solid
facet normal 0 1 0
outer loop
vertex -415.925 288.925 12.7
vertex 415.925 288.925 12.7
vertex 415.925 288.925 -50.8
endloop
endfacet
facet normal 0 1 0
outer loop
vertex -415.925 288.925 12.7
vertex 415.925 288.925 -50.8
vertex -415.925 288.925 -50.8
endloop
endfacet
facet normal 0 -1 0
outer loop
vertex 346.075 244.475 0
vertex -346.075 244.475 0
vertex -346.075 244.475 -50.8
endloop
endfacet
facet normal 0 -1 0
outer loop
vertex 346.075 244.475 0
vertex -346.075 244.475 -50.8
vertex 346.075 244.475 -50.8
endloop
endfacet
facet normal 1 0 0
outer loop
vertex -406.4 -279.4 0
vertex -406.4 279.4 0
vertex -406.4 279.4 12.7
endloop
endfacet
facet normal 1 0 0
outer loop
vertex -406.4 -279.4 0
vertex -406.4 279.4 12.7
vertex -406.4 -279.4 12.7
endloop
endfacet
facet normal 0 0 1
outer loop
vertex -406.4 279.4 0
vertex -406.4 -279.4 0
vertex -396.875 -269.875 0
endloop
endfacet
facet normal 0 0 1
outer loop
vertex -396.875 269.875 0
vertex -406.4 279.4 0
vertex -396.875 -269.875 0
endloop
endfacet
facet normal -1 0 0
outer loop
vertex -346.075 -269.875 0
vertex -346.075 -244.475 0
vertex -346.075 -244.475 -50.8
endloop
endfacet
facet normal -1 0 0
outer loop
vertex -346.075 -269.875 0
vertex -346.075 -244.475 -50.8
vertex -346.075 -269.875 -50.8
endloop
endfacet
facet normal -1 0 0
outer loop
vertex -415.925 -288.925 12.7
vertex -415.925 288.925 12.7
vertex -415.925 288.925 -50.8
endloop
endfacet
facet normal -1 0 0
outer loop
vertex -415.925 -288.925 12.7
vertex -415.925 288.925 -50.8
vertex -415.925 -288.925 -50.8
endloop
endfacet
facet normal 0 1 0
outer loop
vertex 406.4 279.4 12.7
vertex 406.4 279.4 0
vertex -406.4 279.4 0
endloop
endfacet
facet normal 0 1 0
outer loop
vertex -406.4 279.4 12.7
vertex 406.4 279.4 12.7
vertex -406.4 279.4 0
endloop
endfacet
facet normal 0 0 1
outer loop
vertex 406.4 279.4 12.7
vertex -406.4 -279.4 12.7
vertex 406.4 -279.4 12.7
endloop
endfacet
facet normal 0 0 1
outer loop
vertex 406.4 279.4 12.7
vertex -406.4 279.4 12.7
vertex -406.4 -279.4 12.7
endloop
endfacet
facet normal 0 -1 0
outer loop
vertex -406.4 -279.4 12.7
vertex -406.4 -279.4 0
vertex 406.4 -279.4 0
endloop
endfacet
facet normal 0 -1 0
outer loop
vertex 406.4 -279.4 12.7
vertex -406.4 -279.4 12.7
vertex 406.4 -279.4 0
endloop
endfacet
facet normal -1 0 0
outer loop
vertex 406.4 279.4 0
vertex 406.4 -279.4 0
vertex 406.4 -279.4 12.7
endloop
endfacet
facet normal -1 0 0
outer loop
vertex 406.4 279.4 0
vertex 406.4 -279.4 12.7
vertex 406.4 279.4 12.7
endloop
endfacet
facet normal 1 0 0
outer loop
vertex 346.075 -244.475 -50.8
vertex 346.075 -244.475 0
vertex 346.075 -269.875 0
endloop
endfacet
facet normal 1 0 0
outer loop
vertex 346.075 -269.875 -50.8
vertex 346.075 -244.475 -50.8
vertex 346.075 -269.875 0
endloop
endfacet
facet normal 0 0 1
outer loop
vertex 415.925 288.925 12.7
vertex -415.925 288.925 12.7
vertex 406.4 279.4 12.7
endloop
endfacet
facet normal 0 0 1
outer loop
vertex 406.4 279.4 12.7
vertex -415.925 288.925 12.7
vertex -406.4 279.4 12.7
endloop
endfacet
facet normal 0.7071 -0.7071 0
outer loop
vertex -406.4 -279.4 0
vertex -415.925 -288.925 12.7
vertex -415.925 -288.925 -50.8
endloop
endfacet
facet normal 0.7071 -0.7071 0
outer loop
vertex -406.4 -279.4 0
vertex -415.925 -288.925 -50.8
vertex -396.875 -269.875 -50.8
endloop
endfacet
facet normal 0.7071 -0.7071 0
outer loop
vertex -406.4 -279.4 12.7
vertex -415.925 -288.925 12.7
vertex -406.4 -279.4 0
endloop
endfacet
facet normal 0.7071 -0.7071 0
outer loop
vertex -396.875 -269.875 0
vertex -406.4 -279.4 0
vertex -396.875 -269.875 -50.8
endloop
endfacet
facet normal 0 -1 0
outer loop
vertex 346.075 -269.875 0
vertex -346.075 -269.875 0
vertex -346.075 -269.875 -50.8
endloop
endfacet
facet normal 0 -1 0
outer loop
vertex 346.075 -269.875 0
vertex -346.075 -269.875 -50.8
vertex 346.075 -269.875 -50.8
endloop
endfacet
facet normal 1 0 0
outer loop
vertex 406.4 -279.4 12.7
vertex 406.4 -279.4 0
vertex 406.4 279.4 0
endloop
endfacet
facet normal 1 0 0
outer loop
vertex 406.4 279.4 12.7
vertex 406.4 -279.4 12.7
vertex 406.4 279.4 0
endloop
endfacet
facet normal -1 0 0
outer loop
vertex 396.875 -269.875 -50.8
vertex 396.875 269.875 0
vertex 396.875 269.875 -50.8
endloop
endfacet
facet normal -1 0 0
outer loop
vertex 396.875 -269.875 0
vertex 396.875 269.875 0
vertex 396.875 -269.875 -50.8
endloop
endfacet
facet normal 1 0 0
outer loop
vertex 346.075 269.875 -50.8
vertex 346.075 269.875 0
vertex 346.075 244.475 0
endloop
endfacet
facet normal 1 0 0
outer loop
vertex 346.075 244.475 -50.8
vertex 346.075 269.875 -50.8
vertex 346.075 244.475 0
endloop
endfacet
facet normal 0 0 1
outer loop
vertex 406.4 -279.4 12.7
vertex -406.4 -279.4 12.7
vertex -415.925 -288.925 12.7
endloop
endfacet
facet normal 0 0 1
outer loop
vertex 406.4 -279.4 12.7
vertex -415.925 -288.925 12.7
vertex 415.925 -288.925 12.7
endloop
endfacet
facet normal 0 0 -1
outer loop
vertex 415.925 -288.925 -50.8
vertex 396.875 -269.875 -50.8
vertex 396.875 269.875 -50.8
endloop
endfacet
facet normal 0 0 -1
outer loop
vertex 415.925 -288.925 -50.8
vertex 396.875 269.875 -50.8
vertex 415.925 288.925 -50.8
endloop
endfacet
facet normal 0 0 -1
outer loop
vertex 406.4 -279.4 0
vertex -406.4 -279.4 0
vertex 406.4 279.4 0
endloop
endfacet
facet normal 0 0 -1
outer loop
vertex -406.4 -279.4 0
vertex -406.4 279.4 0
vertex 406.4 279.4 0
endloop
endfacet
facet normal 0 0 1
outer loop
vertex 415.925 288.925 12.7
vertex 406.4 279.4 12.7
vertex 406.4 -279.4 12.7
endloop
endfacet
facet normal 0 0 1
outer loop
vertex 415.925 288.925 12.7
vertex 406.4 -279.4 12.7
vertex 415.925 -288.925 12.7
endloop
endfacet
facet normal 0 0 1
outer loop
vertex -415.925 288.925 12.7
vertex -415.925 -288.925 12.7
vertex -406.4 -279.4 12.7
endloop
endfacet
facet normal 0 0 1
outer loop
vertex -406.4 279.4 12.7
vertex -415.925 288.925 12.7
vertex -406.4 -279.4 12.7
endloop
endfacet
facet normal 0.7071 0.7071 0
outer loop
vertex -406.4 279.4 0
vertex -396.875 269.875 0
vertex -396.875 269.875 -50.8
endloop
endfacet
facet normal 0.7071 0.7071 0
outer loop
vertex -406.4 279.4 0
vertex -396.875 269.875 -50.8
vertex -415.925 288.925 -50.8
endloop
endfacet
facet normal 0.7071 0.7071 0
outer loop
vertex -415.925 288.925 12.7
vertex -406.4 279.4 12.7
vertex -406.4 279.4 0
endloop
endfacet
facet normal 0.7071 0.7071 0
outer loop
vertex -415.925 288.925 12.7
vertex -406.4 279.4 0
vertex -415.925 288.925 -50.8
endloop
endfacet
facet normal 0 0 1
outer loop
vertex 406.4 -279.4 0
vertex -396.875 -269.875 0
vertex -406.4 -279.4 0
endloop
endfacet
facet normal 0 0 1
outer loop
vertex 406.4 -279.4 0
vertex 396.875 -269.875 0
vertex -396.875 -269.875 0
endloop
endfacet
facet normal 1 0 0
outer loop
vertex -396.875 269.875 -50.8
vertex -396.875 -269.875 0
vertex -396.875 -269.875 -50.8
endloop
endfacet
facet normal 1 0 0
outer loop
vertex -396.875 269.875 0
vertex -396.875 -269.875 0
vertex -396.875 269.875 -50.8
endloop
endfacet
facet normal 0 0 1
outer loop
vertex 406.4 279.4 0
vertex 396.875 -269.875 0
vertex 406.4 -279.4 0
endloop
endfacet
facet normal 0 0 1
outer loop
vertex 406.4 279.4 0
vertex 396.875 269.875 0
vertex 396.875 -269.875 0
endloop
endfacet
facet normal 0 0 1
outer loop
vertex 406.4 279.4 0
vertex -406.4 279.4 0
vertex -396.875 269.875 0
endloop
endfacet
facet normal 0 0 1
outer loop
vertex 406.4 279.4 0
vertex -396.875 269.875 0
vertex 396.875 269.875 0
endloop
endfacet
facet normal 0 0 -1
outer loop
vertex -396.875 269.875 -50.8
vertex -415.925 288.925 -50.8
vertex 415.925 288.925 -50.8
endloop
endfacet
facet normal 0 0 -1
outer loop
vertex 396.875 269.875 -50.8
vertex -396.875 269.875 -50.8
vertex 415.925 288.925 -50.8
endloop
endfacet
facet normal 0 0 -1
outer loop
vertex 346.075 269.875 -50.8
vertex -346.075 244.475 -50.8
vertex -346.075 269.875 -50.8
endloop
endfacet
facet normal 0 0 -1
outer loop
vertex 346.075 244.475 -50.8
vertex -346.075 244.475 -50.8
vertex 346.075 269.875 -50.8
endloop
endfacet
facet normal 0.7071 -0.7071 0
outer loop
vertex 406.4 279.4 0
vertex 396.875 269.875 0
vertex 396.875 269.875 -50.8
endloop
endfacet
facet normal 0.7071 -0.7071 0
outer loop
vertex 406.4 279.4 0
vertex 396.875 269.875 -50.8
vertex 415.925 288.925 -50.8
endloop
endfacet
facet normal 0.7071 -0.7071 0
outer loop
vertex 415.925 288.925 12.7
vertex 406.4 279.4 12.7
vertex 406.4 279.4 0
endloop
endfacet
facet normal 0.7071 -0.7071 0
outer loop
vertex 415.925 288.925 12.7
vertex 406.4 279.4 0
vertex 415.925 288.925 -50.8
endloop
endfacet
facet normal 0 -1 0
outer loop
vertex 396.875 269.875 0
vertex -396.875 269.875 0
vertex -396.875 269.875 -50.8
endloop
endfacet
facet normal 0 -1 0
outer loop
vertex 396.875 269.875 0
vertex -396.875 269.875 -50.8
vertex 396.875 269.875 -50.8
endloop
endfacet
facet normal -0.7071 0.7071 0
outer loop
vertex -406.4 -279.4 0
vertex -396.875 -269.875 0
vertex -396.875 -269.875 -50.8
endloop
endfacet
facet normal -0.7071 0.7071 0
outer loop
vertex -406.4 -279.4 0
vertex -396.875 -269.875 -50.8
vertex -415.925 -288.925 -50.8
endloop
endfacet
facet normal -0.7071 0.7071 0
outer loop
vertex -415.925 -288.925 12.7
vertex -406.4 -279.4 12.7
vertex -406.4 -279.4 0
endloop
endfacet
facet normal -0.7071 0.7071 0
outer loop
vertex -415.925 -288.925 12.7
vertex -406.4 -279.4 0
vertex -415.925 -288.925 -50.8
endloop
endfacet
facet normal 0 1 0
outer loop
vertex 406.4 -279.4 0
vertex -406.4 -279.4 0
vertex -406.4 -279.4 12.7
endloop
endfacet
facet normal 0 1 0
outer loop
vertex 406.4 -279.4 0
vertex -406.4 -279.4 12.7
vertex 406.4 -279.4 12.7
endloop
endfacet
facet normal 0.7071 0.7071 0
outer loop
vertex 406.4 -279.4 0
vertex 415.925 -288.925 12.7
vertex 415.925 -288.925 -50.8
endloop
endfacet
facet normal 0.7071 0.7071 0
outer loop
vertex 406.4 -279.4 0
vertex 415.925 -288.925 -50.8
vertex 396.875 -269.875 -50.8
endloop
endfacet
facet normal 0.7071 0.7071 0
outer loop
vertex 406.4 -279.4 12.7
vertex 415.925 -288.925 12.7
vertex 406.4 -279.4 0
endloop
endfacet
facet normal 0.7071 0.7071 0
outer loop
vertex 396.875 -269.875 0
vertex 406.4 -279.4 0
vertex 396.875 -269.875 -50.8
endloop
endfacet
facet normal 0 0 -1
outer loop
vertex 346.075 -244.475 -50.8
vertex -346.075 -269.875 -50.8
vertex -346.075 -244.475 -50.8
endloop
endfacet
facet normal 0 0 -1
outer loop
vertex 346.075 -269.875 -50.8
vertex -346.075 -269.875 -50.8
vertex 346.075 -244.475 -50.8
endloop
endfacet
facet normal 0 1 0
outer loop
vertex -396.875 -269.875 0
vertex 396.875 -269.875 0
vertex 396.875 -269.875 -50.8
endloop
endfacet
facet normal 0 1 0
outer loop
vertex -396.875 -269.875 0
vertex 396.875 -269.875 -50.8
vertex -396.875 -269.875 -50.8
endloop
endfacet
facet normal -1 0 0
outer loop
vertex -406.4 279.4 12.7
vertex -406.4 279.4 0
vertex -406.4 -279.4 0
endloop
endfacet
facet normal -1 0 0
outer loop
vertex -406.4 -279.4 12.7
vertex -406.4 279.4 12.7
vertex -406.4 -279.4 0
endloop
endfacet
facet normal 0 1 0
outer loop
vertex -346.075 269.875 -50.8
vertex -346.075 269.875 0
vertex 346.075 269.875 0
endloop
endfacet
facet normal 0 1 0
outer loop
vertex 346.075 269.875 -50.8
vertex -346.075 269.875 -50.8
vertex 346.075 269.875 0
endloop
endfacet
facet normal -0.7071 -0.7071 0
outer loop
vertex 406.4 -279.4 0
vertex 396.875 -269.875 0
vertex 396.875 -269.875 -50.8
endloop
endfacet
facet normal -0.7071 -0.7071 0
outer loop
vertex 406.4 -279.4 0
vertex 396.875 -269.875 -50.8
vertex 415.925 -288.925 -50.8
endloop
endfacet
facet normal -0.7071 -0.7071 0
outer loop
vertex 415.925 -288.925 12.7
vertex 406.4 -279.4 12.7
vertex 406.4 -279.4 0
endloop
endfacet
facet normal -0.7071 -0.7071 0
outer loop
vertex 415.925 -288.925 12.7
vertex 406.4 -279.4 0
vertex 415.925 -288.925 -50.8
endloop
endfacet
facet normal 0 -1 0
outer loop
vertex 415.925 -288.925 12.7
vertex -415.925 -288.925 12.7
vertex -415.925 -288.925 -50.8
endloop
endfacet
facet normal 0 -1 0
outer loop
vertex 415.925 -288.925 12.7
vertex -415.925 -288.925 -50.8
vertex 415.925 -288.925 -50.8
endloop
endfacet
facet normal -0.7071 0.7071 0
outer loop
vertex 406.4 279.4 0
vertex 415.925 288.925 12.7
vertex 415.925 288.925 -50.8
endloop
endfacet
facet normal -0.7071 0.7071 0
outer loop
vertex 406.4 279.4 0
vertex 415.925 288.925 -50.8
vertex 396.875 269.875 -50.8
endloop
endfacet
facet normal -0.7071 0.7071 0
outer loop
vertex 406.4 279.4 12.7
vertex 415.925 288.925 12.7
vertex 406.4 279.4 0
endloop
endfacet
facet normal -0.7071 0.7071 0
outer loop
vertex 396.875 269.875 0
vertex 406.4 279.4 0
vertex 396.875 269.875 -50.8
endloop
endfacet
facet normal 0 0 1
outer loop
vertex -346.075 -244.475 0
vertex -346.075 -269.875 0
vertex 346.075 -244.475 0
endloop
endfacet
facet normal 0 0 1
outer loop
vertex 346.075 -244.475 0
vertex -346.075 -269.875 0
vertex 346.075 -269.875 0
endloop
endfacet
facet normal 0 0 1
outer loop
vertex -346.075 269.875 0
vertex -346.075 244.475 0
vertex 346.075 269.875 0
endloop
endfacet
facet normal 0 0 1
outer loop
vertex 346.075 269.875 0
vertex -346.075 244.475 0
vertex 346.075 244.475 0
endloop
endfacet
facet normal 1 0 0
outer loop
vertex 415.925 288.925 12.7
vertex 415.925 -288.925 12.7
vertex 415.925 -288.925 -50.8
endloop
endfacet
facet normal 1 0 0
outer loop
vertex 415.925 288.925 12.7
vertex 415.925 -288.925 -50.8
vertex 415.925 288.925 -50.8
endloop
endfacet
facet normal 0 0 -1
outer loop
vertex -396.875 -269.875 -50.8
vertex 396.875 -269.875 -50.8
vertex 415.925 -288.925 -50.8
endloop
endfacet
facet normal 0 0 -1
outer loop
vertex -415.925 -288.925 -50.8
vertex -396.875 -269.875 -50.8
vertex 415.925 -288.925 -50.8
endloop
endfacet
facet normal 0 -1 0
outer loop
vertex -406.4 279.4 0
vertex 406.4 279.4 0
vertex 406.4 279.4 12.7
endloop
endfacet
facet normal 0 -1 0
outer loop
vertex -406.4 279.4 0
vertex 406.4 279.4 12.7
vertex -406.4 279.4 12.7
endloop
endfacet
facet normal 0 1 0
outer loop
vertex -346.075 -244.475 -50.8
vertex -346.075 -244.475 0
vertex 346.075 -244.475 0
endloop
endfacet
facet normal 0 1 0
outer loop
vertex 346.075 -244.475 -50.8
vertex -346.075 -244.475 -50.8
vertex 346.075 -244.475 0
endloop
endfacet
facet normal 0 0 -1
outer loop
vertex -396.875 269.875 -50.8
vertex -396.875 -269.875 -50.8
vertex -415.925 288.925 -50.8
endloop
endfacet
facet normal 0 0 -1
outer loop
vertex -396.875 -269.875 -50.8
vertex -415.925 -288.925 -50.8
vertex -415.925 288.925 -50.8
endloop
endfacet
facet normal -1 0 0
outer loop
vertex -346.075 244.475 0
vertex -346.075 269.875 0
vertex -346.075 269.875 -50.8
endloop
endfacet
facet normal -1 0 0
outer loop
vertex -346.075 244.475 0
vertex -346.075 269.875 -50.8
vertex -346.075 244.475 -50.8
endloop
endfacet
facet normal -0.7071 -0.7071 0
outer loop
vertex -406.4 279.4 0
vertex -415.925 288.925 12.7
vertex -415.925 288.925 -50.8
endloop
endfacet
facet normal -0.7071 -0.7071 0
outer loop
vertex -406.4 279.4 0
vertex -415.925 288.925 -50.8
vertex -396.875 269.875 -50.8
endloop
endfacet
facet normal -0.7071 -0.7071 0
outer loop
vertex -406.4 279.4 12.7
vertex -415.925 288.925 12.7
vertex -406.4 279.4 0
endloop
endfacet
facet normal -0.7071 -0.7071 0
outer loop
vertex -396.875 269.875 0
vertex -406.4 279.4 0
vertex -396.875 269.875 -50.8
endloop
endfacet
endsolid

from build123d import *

# Parameters (mm, degrees)
F0_W          = 793.75
F0_H          = 539.75
F1_DEPTH      = 12.7
F2_DEPTH      = 12.7
F2_DEPTH_BACK = 50.8
F3_DEPTH      = 12.7
F3_DEPTH_BACK = 50.8
F4_DEPTH      = 12.7
F4_DEPTH_BACK = 50.8
F5_DEPTH      = 12.7
F5_DEPTH_BACK = 50.8
F7_W          = 692.15
F7_H          = 25.4
F8_DEPTH      = 50.8


with BuildPart() as f1:
    # F0 (on Top) → F1 (new body)
    with BuildSketch(Plane.XY):
        Polygon((-406.4, -279.4), (406.4, -279.4), (396.875, -269.875), (-396.875, -269.875), align=None)
        Rectangle(F0_W, F0_H)
        Polygon((-406.4, 279.4), (-406.4, -279.4), (-396.875, -269.875), (-396.875, 269.875), align=None)
        Polygon((396.875, 269.875), (406.4, 279.4), (-406.4, 279.4), (-396.875, 269.875), align=None)
        Polygon((396.875, -269.875), (406.4, -279.4), (406.4, 279.4), (396.875, 269.875), align=None)
    extrude(amount=F1_DEPTH)


with BuildPart() as f2:
    # F0 (on Top) → F2 (new body, two sides)
    with BuildSketch(Plane.XY) as f2_sk:
        Polygon((-406.4, 279.4), (-406.4, -279.4), (-396.875, -269.875), (-396.875, 269.875), align=None)
        Polygon((-415.925, -288.925), (-406.4, -279.4), (-406.4, 279.4), (-415.925, 288.925), align=None)
    extrude(amount=F2_DEPTH)
    extrude(f2_sk.sketch, amount=-F2_DEPTH_BACK)

    # F6: cut F1
    add(f1.part, mode=Mode.SUBTRACT)


with BuildPart() as f3:
    # F0 (on Top) → F3 (new body, two sides)
    with BuildSketch(Plane.XY) as f3_sk:
        Polygon((-406.4, -279.4), (406.4, -279.4), (396.875, -269.875), (-396.875, -269.875), align=None)
        Polygon((415.925, -288.925), (406.4, -279.4), (-406.4, -279.4), (-415.925, -288.925), align=None)
    extrude(amount=F3_DEPTH)
    extrude(f3_sk.sketch, amount=-F3_DEPTH_BACK)

    # F6: cut F1
    add(f1.part, mode=Mode.SUBTRACT)


with BuildPart() as f4:
    # F0 (on Top) → F4 (new body, two sides)
    with BuildSketch(Plane.XY) as f4_sk:
        Polygon((396.875, -269.875), (406.4, -279.4), (406.4, 279.4), (396.875, 269.875), align=None)
        Polygon((406.4, 279.4), (406.4, -279.4), (415.925, -288.925), (415.925, 288.925), align=None)
    extrude(amount=F4_DEPTH)
    extrude(f4_sk.sketch, amount=-F4_DEPTH_BACK)

    # F6: cut F1
    add(f1.part, mode=Mode.SUBTRACT)


with BuildPart() as f5:
    # F0 (on Top) → F5 (new body, two sides)
    with BuildSketch(Plane.XY) as f5_sk:
        Polygon((396.875, 269.875), (406.4, 279.4), (-406.4, 279.4), (-396.875, 269.875), align=None)
        Polygon((-406.4, 279.4), (406.4, 279.4), (415.925, 288.925), (-415.925, 288.925), align=None)
    extrude(amount=F5_DEPTH)
    extrude(f5_sk.sketch, amount=-F5_DEPTH_BACK)

    # F6: cut F1
    add(f1.part, mode=Mode.SUBTRACT)


with BuildPart() as f8:
    # F7 (on face) → F8 (new body, through all)
    with BuildSketch(Plane(origin=(0, 0, 0), x_dir=(1, 0, 0), z_dir=(0, 0, -1))):
        with Locations((0, 257.175)):
            Rectangle(F7_W, F7_H)
        with Locations((0, -257.175)):
            Rectangle(F7_W, F7_H)
    extrude(amount=F8_DEPTH)


solid = Compound([f1.part, f2.part, f3.part, f4.part, f5.part, f8.part])
